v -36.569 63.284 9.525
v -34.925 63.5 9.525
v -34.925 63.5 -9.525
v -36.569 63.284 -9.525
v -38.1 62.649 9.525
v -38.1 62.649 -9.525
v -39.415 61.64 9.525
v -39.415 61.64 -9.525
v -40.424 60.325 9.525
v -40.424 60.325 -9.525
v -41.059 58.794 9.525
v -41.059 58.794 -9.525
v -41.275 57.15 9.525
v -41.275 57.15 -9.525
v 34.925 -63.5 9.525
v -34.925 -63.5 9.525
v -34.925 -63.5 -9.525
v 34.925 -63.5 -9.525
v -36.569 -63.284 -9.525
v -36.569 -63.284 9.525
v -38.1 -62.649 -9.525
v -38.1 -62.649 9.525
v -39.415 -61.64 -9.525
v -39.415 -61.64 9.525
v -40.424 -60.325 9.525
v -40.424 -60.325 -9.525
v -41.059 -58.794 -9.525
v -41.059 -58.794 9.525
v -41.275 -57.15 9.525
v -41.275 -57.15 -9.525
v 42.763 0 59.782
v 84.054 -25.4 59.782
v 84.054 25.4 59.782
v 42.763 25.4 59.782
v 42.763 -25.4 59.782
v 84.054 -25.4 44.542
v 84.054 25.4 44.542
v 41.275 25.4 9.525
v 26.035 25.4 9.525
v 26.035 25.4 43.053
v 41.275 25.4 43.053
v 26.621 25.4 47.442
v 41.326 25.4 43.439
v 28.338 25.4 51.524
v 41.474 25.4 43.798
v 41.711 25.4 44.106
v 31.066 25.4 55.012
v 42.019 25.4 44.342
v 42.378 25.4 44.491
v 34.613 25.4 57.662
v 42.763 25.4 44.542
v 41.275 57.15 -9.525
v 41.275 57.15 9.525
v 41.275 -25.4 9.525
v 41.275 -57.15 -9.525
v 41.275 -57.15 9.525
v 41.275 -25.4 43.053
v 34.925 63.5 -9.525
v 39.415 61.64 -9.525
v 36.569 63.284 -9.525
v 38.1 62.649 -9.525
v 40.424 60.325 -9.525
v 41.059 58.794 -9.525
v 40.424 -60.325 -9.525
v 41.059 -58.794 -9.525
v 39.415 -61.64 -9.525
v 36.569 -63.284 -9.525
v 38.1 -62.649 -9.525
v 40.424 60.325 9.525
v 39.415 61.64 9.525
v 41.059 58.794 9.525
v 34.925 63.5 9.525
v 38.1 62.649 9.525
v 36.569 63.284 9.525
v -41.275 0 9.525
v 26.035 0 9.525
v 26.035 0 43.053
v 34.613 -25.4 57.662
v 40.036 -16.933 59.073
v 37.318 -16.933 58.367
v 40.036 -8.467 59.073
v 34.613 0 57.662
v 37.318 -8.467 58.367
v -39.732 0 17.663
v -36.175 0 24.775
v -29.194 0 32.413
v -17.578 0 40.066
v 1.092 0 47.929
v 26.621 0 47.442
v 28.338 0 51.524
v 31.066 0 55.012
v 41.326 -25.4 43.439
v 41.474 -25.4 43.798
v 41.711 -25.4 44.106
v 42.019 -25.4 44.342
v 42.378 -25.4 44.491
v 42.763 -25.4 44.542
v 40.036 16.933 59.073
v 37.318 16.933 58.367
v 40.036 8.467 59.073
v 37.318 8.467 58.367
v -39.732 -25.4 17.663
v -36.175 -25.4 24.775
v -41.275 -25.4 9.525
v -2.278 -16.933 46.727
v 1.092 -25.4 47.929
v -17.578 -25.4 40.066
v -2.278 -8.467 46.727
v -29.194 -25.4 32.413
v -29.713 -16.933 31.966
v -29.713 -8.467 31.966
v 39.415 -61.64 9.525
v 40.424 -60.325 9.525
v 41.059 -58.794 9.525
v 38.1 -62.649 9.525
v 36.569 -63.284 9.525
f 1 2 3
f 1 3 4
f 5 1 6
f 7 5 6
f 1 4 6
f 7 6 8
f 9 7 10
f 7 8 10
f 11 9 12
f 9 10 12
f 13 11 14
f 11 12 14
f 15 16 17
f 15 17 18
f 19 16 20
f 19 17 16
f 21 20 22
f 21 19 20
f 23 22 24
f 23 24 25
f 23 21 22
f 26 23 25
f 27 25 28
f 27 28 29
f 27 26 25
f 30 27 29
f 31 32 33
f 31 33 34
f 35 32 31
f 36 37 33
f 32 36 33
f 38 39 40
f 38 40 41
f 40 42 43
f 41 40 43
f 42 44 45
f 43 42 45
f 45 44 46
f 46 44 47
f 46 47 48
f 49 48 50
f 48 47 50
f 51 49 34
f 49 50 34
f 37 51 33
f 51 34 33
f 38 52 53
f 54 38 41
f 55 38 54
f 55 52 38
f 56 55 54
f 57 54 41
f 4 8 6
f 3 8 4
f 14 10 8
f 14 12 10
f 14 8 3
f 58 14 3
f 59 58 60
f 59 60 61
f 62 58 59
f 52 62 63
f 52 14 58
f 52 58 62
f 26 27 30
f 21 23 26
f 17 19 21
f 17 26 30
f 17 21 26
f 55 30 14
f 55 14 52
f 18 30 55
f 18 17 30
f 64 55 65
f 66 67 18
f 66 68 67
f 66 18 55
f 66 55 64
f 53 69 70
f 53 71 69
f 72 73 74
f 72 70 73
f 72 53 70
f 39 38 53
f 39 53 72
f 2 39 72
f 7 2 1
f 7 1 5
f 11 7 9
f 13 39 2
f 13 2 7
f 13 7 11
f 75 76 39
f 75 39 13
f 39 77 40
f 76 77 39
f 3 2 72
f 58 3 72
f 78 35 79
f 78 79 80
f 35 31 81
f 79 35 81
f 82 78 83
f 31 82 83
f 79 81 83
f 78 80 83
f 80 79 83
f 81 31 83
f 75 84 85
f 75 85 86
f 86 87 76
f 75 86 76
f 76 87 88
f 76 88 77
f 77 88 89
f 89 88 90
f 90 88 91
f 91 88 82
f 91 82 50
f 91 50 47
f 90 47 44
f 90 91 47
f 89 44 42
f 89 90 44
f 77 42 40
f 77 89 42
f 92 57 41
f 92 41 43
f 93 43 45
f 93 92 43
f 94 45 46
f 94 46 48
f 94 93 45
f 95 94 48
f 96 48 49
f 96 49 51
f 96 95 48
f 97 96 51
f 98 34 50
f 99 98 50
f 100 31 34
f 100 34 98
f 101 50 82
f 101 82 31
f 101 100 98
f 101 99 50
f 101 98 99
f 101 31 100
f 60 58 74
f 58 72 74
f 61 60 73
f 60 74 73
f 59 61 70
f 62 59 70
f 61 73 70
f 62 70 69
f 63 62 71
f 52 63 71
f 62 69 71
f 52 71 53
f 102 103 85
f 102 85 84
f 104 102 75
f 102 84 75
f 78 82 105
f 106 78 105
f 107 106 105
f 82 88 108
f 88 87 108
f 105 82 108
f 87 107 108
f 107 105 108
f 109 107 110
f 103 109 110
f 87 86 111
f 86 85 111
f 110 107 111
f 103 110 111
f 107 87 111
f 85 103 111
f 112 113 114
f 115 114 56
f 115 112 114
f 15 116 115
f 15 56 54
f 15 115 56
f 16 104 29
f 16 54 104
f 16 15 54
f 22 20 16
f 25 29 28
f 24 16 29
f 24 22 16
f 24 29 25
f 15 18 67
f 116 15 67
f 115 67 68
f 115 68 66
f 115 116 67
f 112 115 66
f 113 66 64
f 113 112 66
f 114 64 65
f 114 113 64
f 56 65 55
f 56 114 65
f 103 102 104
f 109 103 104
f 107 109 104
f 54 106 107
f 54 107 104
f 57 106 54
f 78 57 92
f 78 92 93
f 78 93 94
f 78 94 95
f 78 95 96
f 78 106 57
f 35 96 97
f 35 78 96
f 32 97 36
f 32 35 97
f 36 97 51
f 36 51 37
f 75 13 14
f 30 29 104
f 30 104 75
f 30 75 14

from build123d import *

# Parameters (mm, degrees)
F1_DEPTH = 63.5
F0_W     = 25.4
F0_H     = 15.24
F2_DEPTH = 25.4
F3_DEPTH = 25.4
F4_R     = 6.35


with BuildPart() as f1:
    # F0 (on Front) → F1 (new body, symmetric)
    with BuildSketch(Plane.XZ):
        Polygon((41.275, -9.525), (41.275, 9.525), (26.035, 9.525), (-41.275, 9.525), (-41.275, -9.525), align=None)
    extrude(amount=F1_DEPTH, both=True)

    # F0 (on Front) → F2 (join, symmetric)
    with BuildSketch(Plane.XZ):
        with BuildLine():
            Line((26.035, 9.525), (41.275, 9.525))
            Line((41.275, 9.525), (41.275, 43.0532871165))
            ThreePointArc((41.275, 43.0532871165), (41.710954306, 44.1057739147), (42.7634411042, 44.5417282207))
            Line((42.7634411042, 44.5417282207), (58.6539360017, 44.5417282207))
            Line((58.6539360017, 44.5417282207), (58.6539360017, 59.7817282207))
            Line((58.6539360017, 59.7817282207), (42.7634411042, 59.7817282207))
            add(Edge.make_bspline(
                [(42.7634411042, 59.7817282207), (40.0314907438, 59.0712143993), (37.3116085618, 58.3664493175), (34.6130178648, 57.6618922106)],
                knots=[0, 0, 0, 0, 6.2650251323, 6.2650251323, 6.2650251323, 6.2650251323], degree=3))
            ThreePointArc((34.6130178648, 57.6618922106), (28.3380361374, 51.5237318109), (26.035, 43.0532871165))
            Line((26.035, 43.0532871165), (26.035, 9.525))
        make_face()
        with Locations((71.3539360017, 52.1617282207)):
            Rectangle(F0_W, F0_H)
    extrude(amount=F2_DEPTH, both=True)

    # F0 (on Front) → F3 (join)
    with BuildSketch(Plane.XZ):
        with BuildLine():
            Line((-41.275, 9.525), (26.035, 9.525))
            Line((26.035, 9.525), (26.035, 43.0532871165))
            ThreePointArc((26.035, 43.0532871165), (28.3380361374, 51.5237318109), (34.6130178648, 57.6618922106))
            add(Edge.make_bspline(
                [(34.6130178648, 57.6618922106), (-4.8660731715, 47.3545587597), (-39.7882987615, 37.0917367173), (-41.275, 9.525)],
                knots=[6.2650251323, 6.2650251323, 6.2650251323, 6.2650251323, 97.9193459674, 97.9193459674, 97.9193459674, 97.9193459674], degree=3))
        make_face()
    extrude(amount=F3_DEPTH)

    # F4
    f4_edges = [f1.edges().sort_by_distance(p)[0] for p in [
        (41.275, -63.5, 0),
        (-41.275, -63.5, 0),
        (41.275, 63.5, 0),
        (-41.275, 63.5, 0),
    ]]
    fillet(f4_edges, radius=F4_R)


solid = f1.part
